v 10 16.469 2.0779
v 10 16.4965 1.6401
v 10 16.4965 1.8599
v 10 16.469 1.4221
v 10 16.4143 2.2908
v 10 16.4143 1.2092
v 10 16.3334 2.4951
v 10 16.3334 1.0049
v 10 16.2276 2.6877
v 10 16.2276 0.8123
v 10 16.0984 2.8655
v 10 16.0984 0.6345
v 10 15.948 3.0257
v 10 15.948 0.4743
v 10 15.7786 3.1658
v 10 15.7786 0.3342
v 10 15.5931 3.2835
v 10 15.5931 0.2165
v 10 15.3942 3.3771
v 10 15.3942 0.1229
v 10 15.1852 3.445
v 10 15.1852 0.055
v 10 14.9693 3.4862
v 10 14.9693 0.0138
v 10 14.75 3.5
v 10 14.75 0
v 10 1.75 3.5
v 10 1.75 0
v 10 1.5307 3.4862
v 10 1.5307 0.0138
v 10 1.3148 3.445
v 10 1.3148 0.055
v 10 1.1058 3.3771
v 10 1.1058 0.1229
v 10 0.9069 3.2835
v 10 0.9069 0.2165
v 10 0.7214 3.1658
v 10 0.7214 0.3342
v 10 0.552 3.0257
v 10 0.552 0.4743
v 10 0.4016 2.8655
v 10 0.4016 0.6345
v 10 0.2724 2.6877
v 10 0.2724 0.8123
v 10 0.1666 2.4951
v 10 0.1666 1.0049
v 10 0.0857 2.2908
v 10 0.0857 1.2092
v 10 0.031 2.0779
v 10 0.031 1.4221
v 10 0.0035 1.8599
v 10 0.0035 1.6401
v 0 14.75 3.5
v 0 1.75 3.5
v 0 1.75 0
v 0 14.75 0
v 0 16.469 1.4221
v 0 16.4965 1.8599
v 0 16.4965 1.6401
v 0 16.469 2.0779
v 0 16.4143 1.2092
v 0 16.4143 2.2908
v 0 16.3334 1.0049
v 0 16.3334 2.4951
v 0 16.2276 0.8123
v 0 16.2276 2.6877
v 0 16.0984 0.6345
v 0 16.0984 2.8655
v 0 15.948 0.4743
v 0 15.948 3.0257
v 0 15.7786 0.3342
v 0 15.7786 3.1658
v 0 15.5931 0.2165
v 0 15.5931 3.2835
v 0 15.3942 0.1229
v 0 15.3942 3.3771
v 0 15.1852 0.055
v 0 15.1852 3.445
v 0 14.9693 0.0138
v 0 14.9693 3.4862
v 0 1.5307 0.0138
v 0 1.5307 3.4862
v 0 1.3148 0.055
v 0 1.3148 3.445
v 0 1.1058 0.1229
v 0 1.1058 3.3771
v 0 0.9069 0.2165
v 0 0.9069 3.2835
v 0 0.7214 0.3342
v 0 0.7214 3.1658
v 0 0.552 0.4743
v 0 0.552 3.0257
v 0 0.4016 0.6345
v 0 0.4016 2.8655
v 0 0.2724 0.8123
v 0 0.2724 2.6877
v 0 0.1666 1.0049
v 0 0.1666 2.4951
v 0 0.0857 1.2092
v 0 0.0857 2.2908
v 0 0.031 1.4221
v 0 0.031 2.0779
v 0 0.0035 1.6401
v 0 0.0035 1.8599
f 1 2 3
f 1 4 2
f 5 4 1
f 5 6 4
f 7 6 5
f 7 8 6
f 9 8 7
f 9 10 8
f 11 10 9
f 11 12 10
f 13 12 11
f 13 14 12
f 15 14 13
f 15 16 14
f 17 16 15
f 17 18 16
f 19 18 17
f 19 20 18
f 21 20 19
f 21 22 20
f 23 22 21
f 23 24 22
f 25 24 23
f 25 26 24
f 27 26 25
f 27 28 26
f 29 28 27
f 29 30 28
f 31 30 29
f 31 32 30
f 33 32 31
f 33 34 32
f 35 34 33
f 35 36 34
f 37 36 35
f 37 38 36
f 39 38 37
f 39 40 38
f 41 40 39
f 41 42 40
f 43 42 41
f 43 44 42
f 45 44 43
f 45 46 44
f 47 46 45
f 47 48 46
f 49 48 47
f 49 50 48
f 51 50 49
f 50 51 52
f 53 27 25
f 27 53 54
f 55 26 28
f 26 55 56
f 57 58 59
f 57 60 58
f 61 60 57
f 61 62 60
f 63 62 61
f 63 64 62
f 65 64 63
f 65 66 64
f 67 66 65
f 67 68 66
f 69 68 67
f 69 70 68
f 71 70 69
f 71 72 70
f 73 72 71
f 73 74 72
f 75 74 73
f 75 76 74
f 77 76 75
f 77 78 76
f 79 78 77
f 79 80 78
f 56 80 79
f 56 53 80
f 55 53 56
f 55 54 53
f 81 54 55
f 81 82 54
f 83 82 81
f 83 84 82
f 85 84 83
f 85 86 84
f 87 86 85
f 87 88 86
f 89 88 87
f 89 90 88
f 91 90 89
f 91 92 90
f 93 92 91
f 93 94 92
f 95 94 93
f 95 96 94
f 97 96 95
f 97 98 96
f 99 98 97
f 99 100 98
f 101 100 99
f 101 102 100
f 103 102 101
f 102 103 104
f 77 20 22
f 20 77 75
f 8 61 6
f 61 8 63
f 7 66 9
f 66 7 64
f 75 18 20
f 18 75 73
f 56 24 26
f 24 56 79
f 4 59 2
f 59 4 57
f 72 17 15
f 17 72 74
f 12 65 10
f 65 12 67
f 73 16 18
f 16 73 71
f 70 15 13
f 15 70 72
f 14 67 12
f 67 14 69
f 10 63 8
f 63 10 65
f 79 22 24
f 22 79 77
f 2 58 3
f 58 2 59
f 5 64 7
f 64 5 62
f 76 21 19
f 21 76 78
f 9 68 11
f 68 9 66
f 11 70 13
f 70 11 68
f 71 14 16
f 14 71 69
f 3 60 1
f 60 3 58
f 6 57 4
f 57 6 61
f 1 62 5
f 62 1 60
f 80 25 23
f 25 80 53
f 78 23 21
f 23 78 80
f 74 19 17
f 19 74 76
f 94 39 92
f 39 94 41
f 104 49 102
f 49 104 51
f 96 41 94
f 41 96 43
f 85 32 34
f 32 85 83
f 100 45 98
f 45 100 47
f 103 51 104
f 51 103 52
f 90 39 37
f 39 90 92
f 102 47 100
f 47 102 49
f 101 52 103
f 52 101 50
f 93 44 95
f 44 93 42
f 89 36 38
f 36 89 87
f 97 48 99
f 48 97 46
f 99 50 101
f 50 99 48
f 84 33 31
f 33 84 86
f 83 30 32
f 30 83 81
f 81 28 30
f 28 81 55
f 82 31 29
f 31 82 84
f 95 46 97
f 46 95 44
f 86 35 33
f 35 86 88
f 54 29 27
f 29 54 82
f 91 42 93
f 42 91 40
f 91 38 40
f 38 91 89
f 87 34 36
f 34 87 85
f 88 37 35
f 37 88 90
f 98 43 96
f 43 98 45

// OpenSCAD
$fn=50;

height=3.5;
radius=3.5/2;

translate([0,radius,0]) cube([10, 16.5-height, 3.5]);
translate([0,16.5-radius,radius]) rotate([0,90,0]) cylinder(d=3.5, h=10);
translate([0,radius,radius]) rotate([0,90,0]) cylinder(d=3.5, h=10);
